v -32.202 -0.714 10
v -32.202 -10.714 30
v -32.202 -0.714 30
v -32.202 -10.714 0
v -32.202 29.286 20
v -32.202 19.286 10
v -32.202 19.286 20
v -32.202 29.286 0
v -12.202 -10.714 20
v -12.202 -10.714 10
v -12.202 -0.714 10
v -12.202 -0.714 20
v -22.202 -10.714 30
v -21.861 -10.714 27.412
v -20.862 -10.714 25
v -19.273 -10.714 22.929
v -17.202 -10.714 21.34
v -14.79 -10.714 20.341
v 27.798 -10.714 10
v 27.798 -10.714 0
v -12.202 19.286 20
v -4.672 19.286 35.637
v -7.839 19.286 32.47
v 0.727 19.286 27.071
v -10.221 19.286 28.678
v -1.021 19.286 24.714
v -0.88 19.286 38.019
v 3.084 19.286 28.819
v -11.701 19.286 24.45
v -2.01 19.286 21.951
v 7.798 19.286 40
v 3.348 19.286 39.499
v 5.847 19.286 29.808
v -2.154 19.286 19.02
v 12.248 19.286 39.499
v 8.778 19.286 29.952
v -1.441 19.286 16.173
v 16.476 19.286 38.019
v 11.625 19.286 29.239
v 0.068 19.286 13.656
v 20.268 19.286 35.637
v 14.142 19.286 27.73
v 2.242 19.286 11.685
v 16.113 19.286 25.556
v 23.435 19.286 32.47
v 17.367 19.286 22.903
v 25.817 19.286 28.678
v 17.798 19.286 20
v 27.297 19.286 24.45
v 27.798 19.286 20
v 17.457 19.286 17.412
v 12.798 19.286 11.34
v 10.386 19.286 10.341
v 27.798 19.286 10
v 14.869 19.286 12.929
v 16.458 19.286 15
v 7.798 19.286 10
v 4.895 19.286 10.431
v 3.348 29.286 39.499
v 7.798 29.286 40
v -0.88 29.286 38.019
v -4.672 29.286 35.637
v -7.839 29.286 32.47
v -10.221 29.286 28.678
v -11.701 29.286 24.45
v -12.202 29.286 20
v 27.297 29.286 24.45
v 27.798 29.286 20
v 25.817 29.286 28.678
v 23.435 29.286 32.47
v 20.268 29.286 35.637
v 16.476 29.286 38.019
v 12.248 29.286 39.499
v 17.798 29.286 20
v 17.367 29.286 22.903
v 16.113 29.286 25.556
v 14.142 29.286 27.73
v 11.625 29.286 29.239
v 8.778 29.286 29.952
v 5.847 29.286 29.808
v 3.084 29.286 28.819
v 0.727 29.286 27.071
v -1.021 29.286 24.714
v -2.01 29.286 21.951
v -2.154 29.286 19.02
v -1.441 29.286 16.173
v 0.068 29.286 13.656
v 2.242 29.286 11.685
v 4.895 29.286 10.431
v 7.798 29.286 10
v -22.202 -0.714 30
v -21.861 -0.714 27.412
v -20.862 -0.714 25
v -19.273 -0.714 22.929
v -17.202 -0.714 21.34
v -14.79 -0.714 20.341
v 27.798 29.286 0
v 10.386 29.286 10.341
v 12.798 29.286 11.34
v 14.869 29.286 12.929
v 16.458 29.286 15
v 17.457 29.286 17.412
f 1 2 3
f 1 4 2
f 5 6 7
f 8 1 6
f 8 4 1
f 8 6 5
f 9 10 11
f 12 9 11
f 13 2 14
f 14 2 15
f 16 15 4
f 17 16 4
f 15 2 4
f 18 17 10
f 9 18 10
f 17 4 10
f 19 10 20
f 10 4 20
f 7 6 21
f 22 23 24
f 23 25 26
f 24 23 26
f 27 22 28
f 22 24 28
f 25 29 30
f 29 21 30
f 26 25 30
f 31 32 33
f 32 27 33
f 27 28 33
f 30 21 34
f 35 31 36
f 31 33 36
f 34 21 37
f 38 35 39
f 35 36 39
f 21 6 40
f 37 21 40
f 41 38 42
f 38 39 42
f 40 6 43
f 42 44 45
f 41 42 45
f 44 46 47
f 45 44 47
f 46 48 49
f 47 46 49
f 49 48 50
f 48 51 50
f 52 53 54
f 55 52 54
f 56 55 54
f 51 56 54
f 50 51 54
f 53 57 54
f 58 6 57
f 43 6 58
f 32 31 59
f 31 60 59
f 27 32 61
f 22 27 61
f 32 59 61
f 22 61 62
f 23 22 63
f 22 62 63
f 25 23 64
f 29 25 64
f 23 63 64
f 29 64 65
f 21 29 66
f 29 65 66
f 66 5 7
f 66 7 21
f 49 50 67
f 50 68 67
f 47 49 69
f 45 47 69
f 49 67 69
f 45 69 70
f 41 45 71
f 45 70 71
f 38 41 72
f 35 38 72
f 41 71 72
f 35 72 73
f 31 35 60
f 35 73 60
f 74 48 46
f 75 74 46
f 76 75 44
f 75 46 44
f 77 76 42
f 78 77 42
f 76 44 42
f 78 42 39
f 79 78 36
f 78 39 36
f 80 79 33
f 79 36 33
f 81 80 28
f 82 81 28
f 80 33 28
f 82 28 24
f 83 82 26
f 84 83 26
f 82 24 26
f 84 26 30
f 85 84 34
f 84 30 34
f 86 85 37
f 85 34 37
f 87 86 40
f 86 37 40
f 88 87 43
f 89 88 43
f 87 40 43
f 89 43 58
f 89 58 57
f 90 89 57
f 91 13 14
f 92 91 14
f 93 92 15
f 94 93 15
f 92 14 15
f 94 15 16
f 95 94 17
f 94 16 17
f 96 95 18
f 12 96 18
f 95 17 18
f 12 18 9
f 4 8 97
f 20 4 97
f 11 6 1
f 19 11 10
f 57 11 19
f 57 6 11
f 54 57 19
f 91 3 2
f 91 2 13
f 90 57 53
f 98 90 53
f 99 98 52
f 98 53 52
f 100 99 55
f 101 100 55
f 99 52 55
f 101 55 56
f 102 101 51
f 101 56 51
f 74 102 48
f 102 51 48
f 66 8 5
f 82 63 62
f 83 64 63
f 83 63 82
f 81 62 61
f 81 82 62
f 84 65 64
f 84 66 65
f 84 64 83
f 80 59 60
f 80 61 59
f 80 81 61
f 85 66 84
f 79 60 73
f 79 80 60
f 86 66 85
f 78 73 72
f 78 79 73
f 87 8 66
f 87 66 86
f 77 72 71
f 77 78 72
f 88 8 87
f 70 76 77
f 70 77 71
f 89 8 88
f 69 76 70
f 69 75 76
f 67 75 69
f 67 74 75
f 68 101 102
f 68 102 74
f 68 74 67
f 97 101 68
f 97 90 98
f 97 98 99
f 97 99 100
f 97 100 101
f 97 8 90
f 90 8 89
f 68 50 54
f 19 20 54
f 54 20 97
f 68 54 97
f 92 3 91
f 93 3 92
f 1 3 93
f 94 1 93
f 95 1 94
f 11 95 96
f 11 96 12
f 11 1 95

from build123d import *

# Parameters (mm, degrees)
F0_W      = 60
F0_H      = 40
F1_DEPTH  = 10
F2_W      = 60
F2_H      = 10
F3_DEPTH  = 30
F4_W      = 20
F4_H      = 10
F5_DEPTH  = 20
F6_R      = 19.99999
F8_DEPTH  = 10
F9_W      = 20
F9_H      = 10
F10_DEPTH = 20
F12_DEPTH = 10


# Not quite as in the source:
# - a fillet or chamfer is up to 0.001 mm smaller than in the source, because OpenCascade refuses the exact size


with BuildPart() as f1:
    # F0 (on Top) → F1 (new body)
    with BuildSketch(Plane.XY):
        with Locations((-2.2019557655, 9.2856339355)):
            Rectangle(F0_W, F0_H)
    extrude(amount=F1_DEPTH)

    # F2 (on face) → F3 (join)
    with BuildSketch(Plane.XY.offset(10)):
        with Locations((-2.2019557655, 24.2856339355)):
            Rectangle(F2_W, F2_H)
    extrude(amount=F3_DEPTH)

    # F4 (on face) → F5 (cut)
    with BuildSketch(Plane.XY.offset(40)):
        with Locations((-22.2019557655, 24.2856339355)):
            Rectangle(F4_W, F4_H)
    extrude(amount=-F5_DEPTH, mode=Mode.SUBTRACT)

    # F6 (radius 20 in the source; OpenCascade refuses exactly that, so slightly less here)
    f6_edges = [f1.edges().sort_by_distance(p)[0] for p in [
        (-12.201956, 24.285634, 40),
        (27.798044, 24.285634, 40),
    ]]
    fillet(f6_edges, radius=F6_R)

    # F7 (on face) → F8 (cut)
    with BuildSketch(Plane.XZ.offset(-19.2856339355)):
        with BuildLine():
            ThreePointArc((7.7980442039, 10), (14.8691120356, 12.9289321773), (17.7980442345, 20))
            ThreePointArc((17.7980442345, 20), (0.7269764335, 27.0710678227), (7.7980442039, 10))
        make_face()
    extrude(amount=-F8_DEPTH, mode=Mode.SUBTRACT)

    # F9 (on face) → F10 (join)
    with BuildSketch(Plane.XY.offset(10)):
        with Locations((-22.2019557655, -5.7143660645)):
            Rectangle(F9_W, F9_H)
    extrude(amount=F10_DEPTH)

    # F11 (on face) → F12 (cut)
    with BuildSketch(Plane.XZ.offset(10.7143660645)):
        with BuildLine():
            Line((-12.2019557655, 30), (-22.2019557655, 30))
            ThreePointArc((-22.2019557655, 30), (-19.2730235774, 22.9289321881), (-12.2019557655, 20))
            Line((-12.2019557655, 20), (-12.2019557655, 30))
        make_face()
    extrude(amount=-F12_DEPTH, mode=Mode.SUBTRACT)


solid = f1.part
